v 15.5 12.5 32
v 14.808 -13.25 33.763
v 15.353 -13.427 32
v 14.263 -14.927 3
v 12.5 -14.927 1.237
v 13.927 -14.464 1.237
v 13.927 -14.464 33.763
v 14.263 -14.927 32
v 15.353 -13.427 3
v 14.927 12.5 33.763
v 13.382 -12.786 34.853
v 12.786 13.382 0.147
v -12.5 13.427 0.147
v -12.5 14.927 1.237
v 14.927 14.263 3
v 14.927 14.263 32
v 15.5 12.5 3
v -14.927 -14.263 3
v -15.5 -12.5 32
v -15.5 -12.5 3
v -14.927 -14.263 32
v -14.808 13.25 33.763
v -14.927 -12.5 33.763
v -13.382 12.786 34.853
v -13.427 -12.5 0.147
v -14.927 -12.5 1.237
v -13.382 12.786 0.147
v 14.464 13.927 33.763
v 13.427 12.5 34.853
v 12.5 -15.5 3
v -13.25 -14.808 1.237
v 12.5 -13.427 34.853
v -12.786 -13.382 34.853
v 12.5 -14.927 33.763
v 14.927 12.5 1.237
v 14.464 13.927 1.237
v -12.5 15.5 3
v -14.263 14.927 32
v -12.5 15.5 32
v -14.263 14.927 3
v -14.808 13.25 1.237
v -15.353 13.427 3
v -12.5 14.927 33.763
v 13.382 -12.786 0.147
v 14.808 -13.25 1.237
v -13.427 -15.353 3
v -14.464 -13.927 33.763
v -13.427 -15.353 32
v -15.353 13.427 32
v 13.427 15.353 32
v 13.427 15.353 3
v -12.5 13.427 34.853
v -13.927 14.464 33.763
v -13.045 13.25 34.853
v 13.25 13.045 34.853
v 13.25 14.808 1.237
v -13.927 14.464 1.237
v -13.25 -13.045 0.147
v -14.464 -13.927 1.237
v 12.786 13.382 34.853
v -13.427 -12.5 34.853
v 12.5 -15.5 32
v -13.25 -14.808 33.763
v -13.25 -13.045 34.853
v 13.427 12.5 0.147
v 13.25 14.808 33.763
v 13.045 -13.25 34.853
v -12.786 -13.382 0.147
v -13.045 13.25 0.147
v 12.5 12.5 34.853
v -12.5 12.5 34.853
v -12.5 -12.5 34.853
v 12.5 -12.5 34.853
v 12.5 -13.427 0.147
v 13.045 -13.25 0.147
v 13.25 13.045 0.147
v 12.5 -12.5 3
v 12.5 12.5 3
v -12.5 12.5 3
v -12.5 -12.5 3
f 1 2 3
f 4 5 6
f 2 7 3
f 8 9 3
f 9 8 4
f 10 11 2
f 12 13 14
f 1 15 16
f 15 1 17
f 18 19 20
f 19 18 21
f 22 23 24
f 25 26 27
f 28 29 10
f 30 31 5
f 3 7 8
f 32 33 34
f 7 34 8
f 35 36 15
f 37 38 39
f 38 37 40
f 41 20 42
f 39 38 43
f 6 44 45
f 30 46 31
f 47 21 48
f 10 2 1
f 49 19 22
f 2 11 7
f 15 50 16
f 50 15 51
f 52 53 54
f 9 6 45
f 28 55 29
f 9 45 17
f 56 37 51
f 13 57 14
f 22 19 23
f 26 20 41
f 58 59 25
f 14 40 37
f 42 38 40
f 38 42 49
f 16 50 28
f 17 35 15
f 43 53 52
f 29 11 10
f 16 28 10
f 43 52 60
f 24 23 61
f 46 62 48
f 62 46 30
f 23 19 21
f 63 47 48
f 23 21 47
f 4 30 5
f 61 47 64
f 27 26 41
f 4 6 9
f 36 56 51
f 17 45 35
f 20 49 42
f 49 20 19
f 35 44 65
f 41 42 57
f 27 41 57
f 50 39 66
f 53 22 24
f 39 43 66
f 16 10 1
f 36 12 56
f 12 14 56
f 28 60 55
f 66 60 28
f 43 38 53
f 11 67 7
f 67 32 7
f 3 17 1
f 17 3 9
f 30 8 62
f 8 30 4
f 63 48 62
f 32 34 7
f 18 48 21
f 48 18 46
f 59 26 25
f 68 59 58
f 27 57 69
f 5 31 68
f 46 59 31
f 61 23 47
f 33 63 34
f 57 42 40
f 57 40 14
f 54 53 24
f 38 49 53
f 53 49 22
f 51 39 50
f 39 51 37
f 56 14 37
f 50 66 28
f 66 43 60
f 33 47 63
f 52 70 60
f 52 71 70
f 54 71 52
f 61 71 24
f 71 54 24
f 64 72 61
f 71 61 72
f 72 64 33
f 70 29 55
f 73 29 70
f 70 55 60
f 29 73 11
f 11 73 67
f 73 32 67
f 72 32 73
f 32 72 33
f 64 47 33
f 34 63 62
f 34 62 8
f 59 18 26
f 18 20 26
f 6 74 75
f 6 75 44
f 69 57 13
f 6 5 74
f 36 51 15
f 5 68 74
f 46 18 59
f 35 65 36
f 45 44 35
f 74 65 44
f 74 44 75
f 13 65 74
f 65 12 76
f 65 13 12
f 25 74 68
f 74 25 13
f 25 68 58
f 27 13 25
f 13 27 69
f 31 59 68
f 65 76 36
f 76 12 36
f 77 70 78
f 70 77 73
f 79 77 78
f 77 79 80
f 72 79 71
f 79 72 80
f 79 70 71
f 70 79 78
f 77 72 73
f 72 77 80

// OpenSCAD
// The hight of the cap.
cap_hight=35;

// The length of the hammer face.
hammer_length=25;

// The length of the hammer face.
hammer_width=25;

// The thickness of the surrounding walls.
wall_thickness=3;       // [1:15]

// The thickness of the hammer cap face.
bottom_thickness = 3;  // [1:15]

difference()
{
    hull()
    {
        for(i=[0:4])
        {
            rotate([0, 0, i*90])
            {
                translate([((i%2)*hammer_length+((i+1)%2)*hammer_width)/2, (((i+1)%2)*hammer_length+(i%2)*hammer_width)/2, wall_thickness])
                {
                    sphere(wall_thickness);
                    translate([0, 0, cap_hight-2*wall_thickness])
                    {
                        sphere(wall_thickness);
                    }
                }
            }
        }
    }
    translate([-hammer_width/2, -hammer_length/2, bottom_thickness])
    {
        cube([hammer_width, hammer_length, cap_hight]);
    }
}
